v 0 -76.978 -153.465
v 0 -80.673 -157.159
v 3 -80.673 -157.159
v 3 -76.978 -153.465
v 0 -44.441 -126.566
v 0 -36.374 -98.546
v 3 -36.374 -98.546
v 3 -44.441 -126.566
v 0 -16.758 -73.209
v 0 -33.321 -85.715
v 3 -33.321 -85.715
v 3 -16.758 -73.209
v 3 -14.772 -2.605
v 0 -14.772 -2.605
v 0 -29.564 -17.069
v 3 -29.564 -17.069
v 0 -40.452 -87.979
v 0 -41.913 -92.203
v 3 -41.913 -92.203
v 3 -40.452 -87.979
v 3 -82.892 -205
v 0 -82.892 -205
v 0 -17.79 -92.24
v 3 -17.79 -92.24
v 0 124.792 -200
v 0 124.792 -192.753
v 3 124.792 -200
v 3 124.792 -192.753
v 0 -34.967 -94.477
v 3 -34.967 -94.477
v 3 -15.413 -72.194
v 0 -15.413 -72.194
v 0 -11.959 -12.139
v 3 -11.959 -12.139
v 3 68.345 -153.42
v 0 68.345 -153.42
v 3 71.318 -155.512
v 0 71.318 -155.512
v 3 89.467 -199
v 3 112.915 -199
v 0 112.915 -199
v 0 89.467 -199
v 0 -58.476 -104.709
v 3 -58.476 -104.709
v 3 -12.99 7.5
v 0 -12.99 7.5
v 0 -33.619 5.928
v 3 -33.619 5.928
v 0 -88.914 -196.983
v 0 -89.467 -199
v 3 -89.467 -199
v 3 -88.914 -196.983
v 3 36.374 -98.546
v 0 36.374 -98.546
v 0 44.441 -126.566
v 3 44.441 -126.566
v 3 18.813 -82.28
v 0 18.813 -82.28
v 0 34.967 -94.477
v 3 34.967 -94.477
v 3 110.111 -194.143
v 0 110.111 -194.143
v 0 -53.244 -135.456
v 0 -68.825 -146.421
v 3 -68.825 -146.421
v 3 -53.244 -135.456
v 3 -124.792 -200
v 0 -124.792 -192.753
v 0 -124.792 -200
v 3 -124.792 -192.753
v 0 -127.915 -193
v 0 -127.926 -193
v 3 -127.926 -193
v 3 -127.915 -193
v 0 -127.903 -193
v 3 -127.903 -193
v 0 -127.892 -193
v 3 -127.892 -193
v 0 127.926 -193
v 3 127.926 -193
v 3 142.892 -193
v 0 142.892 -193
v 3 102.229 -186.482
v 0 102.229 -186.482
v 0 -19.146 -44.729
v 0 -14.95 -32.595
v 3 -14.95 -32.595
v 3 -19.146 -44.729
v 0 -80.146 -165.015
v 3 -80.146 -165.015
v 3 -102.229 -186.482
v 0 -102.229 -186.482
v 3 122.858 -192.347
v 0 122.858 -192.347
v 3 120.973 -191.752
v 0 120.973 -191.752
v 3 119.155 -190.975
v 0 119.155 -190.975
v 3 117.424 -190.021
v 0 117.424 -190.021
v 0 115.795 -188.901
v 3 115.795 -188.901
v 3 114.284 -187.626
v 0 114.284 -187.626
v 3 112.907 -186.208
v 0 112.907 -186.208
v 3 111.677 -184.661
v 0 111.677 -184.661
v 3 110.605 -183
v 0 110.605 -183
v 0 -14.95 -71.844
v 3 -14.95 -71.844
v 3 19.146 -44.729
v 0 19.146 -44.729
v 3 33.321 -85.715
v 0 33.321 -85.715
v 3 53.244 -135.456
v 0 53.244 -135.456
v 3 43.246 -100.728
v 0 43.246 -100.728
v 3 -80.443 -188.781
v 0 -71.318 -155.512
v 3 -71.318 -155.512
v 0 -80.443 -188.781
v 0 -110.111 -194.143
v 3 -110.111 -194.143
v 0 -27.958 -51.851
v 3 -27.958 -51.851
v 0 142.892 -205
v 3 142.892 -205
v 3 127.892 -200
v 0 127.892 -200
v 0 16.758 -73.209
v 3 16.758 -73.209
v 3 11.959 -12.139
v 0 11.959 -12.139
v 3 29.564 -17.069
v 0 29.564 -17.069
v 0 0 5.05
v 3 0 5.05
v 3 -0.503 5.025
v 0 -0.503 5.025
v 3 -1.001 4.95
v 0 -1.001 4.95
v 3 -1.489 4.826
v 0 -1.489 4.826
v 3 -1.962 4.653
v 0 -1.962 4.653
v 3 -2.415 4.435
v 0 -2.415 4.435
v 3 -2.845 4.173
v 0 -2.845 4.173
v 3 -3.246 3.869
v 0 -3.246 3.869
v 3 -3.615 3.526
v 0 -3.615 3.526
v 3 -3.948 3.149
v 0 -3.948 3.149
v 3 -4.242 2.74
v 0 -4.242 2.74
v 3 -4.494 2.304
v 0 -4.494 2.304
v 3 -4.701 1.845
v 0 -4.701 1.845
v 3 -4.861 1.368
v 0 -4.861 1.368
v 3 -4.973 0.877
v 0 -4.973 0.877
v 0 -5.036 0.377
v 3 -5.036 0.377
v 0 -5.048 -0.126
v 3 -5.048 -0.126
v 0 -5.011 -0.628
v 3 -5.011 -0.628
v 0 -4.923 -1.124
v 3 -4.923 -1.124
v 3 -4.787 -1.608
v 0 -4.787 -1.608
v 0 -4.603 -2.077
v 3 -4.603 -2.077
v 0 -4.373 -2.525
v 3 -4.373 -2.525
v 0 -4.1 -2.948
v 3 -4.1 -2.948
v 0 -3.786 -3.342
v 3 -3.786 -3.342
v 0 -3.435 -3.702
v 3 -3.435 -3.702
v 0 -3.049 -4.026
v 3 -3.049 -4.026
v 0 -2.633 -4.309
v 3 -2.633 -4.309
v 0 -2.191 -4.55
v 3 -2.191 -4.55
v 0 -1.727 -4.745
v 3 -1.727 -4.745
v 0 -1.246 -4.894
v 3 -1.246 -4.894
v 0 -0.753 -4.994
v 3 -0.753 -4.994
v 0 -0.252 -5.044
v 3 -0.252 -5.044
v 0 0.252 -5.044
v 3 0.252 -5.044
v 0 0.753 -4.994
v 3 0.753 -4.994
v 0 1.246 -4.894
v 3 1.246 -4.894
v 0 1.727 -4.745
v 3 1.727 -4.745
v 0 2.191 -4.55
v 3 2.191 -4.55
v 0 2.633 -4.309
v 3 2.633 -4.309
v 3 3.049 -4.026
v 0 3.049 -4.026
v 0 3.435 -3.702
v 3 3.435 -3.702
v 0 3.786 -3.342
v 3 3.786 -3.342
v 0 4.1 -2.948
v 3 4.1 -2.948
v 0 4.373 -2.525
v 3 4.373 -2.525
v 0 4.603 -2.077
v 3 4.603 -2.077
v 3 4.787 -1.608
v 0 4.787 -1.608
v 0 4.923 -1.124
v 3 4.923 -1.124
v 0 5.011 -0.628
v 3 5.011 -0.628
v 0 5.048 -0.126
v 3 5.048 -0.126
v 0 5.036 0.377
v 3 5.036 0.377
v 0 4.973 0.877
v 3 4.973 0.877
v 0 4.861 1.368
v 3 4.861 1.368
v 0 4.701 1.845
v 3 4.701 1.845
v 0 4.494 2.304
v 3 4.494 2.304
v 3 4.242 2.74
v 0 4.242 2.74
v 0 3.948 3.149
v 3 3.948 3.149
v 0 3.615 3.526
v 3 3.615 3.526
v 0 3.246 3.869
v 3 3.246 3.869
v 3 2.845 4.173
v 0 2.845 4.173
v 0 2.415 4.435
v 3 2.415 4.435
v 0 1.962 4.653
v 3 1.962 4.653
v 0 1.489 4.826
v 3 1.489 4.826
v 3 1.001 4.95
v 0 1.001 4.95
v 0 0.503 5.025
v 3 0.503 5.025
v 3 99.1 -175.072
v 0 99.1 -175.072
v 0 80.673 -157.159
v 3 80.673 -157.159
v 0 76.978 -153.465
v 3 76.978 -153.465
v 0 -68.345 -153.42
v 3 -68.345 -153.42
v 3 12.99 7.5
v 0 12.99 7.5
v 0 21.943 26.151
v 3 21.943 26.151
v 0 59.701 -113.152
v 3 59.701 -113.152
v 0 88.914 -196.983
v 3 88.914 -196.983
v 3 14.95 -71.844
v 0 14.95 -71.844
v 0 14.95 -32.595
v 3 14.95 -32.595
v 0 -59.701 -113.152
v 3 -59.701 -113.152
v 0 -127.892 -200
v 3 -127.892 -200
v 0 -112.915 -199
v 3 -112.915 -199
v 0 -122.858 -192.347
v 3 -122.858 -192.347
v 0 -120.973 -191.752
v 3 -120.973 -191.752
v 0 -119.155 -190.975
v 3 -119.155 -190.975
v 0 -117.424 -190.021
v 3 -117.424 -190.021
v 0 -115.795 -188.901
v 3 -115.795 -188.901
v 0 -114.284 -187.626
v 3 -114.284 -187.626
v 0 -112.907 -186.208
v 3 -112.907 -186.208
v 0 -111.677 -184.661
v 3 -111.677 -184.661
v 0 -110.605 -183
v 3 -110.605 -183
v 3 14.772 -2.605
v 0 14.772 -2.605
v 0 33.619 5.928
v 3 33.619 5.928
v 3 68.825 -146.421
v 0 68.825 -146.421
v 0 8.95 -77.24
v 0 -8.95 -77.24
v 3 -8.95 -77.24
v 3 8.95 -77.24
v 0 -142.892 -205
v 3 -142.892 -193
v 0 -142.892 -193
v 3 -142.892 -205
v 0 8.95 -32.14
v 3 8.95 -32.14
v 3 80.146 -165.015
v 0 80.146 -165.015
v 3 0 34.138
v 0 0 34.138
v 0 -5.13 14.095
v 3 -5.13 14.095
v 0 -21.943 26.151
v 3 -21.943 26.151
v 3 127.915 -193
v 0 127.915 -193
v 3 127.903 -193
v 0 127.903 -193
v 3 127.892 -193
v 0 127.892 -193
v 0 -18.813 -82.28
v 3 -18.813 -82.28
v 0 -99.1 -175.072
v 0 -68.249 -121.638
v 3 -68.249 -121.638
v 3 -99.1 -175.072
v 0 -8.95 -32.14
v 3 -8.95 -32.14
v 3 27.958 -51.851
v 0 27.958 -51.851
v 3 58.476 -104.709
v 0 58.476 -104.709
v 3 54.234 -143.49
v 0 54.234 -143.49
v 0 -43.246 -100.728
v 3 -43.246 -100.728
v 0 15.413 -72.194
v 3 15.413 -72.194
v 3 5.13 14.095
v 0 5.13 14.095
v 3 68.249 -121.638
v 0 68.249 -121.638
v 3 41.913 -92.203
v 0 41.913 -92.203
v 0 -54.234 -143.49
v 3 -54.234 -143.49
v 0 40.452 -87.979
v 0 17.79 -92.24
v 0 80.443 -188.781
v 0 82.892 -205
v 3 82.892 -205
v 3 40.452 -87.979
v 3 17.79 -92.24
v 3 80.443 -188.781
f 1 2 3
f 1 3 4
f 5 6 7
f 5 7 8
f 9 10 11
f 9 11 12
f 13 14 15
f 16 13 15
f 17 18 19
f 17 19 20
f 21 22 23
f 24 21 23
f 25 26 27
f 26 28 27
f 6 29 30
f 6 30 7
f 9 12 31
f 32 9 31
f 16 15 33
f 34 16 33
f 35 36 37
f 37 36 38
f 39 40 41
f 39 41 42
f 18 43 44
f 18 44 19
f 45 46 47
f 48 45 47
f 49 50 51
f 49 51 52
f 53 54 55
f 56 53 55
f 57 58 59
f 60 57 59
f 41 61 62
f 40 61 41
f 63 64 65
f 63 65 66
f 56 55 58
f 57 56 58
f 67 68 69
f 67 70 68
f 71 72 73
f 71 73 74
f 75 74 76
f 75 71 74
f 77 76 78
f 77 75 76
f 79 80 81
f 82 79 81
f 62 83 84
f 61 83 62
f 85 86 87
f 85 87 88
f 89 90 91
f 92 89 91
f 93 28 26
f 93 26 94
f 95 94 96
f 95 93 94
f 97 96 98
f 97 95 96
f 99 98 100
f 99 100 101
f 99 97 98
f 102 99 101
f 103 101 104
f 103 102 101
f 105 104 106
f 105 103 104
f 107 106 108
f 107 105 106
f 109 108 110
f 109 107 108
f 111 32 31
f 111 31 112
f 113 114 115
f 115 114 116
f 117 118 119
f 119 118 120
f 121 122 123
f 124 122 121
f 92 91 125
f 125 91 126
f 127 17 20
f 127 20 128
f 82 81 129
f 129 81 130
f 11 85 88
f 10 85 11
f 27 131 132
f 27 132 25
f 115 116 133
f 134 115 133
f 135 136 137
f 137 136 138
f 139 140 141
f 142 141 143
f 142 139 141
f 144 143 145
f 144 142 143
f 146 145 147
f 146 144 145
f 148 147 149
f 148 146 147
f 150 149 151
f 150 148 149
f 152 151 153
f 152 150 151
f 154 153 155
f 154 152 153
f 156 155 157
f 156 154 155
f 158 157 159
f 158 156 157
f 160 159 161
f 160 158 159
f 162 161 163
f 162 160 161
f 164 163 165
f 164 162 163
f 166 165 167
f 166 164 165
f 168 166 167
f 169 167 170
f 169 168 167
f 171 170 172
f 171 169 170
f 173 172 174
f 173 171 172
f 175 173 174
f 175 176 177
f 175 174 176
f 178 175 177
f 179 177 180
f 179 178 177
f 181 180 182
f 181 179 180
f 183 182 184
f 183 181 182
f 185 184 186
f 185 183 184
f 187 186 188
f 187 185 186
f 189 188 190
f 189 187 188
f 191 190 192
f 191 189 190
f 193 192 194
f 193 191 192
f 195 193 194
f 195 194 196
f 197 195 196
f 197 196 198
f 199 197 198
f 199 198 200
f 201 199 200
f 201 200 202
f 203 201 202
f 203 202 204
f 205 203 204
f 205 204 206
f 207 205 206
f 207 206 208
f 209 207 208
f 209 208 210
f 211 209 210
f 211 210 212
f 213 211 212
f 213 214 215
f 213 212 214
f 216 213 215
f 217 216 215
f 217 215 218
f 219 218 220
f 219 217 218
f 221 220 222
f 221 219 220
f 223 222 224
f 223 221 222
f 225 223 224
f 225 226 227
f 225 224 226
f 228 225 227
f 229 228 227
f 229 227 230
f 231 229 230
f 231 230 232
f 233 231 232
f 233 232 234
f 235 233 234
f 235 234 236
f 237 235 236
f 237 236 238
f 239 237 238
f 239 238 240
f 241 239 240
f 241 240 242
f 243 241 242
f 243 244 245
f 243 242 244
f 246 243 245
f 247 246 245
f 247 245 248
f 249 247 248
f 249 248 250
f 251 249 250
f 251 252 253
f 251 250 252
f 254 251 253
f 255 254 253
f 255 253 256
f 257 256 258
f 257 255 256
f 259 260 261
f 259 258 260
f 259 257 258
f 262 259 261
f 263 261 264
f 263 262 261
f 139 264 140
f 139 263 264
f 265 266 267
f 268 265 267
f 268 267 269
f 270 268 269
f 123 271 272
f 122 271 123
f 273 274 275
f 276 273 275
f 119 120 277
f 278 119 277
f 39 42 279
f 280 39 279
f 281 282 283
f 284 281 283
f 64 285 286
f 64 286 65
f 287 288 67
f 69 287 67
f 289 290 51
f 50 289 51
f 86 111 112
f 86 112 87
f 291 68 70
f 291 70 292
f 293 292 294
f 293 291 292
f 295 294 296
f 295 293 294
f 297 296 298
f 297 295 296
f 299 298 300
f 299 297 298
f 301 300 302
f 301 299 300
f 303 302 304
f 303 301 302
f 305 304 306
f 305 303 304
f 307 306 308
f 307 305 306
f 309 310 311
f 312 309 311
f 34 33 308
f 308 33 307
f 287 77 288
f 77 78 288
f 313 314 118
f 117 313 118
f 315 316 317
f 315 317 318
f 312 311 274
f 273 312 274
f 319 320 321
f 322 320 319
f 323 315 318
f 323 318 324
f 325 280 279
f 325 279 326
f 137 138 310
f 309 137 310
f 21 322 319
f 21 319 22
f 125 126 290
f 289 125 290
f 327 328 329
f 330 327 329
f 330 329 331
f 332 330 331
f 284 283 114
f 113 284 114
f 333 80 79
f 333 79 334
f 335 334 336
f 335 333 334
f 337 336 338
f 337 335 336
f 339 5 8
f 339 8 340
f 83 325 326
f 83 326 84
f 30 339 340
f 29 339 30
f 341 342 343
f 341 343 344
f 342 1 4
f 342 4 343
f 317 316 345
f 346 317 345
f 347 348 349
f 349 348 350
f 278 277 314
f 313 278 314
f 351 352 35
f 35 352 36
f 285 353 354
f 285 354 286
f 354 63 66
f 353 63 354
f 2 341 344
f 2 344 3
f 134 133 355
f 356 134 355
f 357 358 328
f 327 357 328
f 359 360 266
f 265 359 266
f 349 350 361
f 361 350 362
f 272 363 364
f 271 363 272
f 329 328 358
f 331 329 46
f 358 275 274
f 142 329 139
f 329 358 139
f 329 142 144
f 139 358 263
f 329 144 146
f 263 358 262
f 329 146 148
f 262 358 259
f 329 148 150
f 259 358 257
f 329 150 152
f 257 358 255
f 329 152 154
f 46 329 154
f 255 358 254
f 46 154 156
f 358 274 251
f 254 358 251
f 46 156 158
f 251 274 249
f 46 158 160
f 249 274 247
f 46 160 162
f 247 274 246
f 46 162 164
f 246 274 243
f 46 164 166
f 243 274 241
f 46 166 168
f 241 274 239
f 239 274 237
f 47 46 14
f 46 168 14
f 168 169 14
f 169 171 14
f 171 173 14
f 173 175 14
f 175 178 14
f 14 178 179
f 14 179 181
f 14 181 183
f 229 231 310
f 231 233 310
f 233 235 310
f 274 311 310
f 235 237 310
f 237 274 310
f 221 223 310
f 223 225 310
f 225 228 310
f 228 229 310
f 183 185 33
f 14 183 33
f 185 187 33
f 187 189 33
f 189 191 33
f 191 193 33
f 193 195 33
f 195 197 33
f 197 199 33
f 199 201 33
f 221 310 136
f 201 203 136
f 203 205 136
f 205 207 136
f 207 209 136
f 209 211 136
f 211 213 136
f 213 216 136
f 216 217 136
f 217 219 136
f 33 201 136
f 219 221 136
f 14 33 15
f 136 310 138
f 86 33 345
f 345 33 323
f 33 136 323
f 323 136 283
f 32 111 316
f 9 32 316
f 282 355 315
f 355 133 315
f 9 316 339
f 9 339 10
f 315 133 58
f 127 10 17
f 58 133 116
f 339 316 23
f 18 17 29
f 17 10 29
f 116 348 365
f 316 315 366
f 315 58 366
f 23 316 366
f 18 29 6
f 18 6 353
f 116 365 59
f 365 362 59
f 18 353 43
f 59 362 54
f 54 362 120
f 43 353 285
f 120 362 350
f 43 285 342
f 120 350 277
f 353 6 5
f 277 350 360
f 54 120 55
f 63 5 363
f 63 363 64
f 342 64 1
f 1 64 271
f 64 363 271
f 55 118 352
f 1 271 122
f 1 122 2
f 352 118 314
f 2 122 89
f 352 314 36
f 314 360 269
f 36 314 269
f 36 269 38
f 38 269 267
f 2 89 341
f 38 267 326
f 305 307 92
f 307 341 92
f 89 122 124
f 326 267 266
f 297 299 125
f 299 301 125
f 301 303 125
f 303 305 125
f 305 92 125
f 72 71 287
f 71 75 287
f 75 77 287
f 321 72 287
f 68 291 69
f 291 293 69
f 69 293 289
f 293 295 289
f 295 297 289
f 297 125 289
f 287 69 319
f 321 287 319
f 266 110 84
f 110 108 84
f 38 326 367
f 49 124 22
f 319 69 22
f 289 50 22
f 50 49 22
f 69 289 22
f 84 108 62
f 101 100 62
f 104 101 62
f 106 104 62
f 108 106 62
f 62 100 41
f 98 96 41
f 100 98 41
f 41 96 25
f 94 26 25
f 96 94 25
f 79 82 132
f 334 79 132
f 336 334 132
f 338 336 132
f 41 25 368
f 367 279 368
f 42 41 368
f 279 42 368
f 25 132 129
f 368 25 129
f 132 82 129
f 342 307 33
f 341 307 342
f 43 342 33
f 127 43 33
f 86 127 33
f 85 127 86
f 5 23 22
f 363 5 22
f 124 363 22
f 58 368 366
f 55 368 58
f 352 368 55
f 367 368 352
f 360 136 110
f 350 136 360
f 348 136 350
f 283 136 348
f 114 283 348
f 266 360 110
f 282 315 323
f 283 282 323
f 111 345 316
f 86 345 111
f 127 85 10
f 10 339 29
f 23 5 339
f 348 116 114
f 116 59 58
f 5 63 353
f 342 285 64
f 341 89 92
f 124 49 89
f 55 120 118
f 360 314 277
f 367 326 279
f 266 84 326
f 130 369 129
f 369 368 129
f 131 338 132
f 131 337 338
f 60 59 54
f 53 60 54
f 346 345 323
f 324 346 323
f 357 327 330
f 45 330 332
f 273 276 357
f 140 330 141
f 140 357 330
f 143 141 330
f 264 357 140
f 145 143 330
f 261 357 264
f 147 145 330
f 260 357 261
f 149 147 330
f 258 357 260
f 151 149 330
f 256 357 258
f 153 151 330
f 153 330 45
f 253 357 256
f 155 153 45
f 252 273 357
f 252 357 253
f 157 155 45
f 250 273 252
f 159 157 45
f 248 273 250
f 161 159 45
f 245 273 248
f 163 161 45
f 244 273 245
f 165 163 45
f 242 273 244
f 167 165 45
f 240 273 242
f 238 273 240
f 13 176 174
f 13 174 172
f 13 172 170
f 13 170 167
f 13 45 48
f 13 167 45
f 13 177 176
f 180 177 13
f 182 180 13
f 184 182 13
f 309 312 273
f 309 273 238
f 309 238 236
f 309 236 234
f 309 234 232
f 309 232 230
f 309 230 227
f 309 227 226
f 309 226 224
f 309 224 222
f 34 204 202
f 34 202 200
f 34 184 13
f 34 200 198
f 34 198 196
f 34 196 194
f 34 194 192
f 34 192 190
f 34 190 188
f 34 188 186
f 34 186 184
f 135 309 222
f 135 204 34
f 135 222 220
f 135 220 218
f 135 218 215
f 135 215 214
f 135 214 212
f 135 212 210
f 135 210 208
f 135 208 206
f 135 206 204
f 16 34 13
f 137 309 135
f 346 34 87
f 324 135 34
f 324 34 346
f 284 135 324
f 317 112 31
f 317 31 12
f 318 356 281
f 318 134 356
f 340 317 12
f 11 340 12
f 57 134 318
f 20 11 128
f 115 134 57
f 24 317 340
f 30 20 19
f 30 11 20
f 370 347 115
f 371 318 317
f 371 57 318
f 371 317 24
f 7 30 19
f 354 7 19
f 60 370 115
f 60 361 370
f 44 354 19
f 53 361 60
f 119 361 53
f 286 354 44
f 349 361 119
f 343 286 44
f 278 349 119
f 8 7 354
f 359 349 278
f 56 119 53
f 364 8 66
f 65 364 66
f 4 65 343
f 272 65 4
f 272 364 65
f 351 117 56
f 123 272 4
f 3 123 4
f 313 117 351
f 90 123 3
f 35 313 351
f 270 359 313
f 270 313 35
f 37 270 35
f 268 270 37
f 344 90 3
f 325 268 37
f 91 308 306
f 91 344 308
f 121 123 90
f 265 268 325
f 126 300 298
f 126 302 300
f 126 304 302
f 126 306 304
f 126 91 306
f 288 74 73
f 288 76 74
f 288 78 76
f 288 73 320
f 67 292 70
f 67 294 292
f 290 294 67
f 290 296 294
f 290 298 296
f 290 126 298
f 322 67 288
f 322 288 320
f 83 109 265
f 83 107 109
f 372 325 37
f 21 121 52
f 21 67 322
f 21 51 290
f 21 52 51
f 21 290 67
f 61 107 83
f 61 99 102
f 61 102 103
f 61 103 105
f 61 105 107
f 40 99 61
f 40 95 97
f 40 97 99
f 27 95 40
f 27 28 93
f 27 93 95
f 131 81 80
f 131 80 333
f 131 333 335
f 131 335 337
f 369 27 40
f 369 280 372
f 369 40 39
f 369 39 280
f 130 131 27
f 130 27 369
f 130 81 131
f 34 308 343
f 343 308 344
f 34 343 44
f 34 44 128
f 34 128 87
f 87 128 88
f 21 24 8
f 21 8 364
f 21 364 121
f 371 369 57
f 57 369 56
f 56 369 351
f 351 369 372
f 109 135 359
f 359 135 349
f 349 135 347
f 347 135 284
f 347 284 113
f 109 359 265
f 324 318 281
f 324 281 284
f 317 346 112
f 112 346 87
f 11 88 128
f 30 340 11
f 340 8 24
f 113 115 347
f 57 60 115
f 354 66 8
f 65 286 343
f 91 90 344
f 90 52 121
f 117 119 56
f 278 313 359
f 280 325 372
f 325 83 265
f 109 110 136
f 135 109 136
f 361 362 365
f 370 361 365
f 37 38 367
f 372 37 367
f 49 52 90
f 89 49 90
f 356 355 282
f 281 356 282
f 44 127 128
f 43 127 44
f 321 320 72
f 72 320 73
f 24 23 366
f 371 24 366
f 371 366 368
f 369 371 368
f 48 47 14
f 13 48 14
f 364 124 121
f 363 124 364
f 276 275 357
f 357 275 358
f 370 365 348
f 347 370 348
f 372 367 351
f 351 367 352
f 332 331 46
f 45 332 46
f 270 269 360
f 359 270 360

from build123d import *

# Parameters (mm, degrees)
SKETCH1_R                      = 4.95
SKETCH1_W                      = 17.9
SKETCH1_H                      = 45.1
BOSS_EXTRUDE1_DEPTH            = 3
CUT_EXTRUDE1_DEPTH             = 251.790202921
CUT_EXTRUDE1_DEPTH_BACK        = 251.790202921
SKETCH2_W                      = 258.160615752
SKETCH2_H                      = 10
SKETCH3_W                      = 12
SKETCH3_H                      = 60
BOSS_EXTRUDE2_DEPTH            = 3
FILLET1_R                      = 20
BOSS_EXTRUDE3_START            = -3
BOSS_EXTRUDE3_DEPTH            = 3
CIRPATTERN1_COUNT              = 9
SKETCH5_W                      = 17
SKETCH5_H                      = 3.1
CUT_EXTRUDE2_DEPTH             = 250.90439271
CUT_EXTRUDE3_DEPTH             = 250.90439271
MAIN_SHAFT_CLEARANCE_PROFILE_R = 5.05
SHAFT_CLEARANCE_10P1_DEPTH     = 250.90439271


with BuildPart() as part:
    # Sketch1 → Boss-Extrude1 (new body)
    with BuildSketch(Plane.YZ):
        with BuildLine():
            Line((-10.899695646, -10.305175148), (-129.080307876, -215))
            Line((-129.080307876, -215), (-88.665789032, -215))
            Line((-88.665789032, -215), (-17.790269987, -92.24))
            Line((-17.790269987, -92.24), (17.790269987, -92.24))
            Line((17.790269987, -92.24), (88.665789032, -215))
            Line((88.665789032, -215), (129.080307876, -215))
            Line((129.080307876, -215), (10.899695646, -10.305175148))
            ThreePointArc((10.899695646, -10.305175148), (0, 15), (-10.899695646, -10.305175148))
        make_face()
        Circle(SKETCH1_R, mode=Mode.SUBTRACT)
        with Locations((0, -54.69)):
            Rectangle(SKETCH1_W, SKETCH1_H, mode=Mode.SUBTRACT)
    extrude(amount=BOSS_EXTRUDE1_DEPTH)

    # Sketch2 → Cut-Extrude1 (cut, two sides: drawn at the far end of the back side and taken through both)
    with BuildSketch(Plane.YZ.offset(3).offset(-CUT_EXTRUDE1_DEPTH_BACK)):
        with Locations((0, -210)):
            Rectangle(SKETCH2_W, SKETCH2_H)
    extrude(amount=CUT_EXTRUDE1_DEPTH + CUT_EXTRUDE1_DEPTH_BACK, mode=Mode.SUBTRACT)

    # Sketch3 → Boss-Extrude2 (add)
    with BuildSketch(Plane(origin=(3, 0, 0), x_dir=(0, 0, -1), z_dir=(1, 0, 0))):
        with Locations((199, -112.892286341)):
            Rectangle(SKETCH3_W, SKETCH3_H)
        with Locations((199, 112.892286341)):
            Rectangle(SKETCH3_W, SKETCH3_H)
    extrude(amount=-BOSS_EXTRUDE2_DEPTH)

    # Fillet1
    fillet1_edges = [part.edges().sort_by_distance(p)[0] for p in [
        (1.5, 116.378601954, -193),
        (1.5, -116.378601954, -193),
    ]]
    fillet(fillet1_edges, radius=FILLET1_R)

    # Sketch4 → Boss-Extrude3 (add)
    with BuildSketch(Plane(origin=(3, 0, 0), x_dir=(0, 0, -1), z_dir=(1, 0, 0)).offset(BOSS_EXTRUDE3_START)):
        with BuildLine():
            Line((-34.137962787, 0), (-14.095389312, -5.13030215))
            ThreePointArc((-14.095389312, -5.13030215), (-15, 0), (-14.095389312, 5.13030215))
            Line((-14.095389312, 5.13030215), (-34.137962787, 0))
        make_face()
    boss_extrude3 = extrude(amount=BOSS_EXTRUDE3_DEPTH)

    # CirPattern1: Boss-Extrude3 ×9 about axis
    cirpattern1_axis = Axis((-0.1501615, 0, 0), (1, 0, 0))
    for i in range(1, CIRPATTERN1_COUNT):
        add(boss_extrude3.rotate(cirpattern1_axis, i * 360 / CIRPATTERN1_COUNT))

    # Sketch5 → Cut-Extrude2 (cut, symmetric)
    with BuildSketch(Plane(origin=(3, 0, 0), x_dir=(0, 0, -1), z_dir=(1, 0, 0))):
        with Locations((191.5, -126.342286341)):
            Rectangle(SKETCH5_W, SKETCH5_H)
    cut_extrude2 = extrude(amount=CUT_EXTRUDE2_DEPTH, both=True, mode=Mode.SUBTRACT)

    # Mirror1: Cut-Extrude2 across plane
    add(cut_extrude2.mirror(Plane.ZX), mode=Mode.SUBTRACT)

    # Sketch6 → Cut-Extrude3 (cut, symmetric)
    with BuildSketch(Plane.YZ.offset(3)):
        Polygon((-44.440620352, -126.565865893), (-18.81339339, -82.279763058), (-34.966746745, -94.476691336), (-36.374058239, -98.54606889), align=None)
        Polygon((-33.320603167, -85.715441185), (-14.95, -71.844331927), (-14.95, -32.59506202), align=None)
        Polygon((-80.442842118, -188.780872527), (-54.234238638, -143.490099921), (-71.318419935, -155.512353255), align=None)
        Polygon((-41.912952433, -92.203274728), (-27.957868434, -51.850797102), (-58.475794969, -104.709396402), align=None)
        Polygon((-112.914500338, -199), (-89.467175046, -199), (-80.146284863, -165.015139537), (-110.110561046, -194.143434684), align=None)
        Polygon((-76.978433226, -153.464848336), (-68.249306861, -121.637615567), (-99.099637478, -175.071955626), (-80.672732205, -157.159147315), align=None)
        Polygon((-43.245914121, -100.728050325), (-59.700544534, -113.152464165), (-68.824966717, -146.420983438), (-53.243788825, -135.456403713), align=None)
    cut_extrude3 = extrude(amount=CUT_EXTRUDE3_DEPTH, both=True, mode=Mode.SUBTRACT)

    # Mirror2: Cut-Extrude3 across plane
    add(cut_extrude3.mirror(Plane.ZX), mode=Mode.SUBTRACT)

    # Main_shaft_clearance_profile → Shaft_clearance_10p1 (cut, through all)
    with BuildSketch(Plane.YZ):
        Circle(MAIN_SHAFT_CLEARANCE_PROFILE_R)
    extrude(amount=SHAFT_CLEARANCE_10P1_DEPTH, mode=Mode.SUBTRACT)


solid = part.part
